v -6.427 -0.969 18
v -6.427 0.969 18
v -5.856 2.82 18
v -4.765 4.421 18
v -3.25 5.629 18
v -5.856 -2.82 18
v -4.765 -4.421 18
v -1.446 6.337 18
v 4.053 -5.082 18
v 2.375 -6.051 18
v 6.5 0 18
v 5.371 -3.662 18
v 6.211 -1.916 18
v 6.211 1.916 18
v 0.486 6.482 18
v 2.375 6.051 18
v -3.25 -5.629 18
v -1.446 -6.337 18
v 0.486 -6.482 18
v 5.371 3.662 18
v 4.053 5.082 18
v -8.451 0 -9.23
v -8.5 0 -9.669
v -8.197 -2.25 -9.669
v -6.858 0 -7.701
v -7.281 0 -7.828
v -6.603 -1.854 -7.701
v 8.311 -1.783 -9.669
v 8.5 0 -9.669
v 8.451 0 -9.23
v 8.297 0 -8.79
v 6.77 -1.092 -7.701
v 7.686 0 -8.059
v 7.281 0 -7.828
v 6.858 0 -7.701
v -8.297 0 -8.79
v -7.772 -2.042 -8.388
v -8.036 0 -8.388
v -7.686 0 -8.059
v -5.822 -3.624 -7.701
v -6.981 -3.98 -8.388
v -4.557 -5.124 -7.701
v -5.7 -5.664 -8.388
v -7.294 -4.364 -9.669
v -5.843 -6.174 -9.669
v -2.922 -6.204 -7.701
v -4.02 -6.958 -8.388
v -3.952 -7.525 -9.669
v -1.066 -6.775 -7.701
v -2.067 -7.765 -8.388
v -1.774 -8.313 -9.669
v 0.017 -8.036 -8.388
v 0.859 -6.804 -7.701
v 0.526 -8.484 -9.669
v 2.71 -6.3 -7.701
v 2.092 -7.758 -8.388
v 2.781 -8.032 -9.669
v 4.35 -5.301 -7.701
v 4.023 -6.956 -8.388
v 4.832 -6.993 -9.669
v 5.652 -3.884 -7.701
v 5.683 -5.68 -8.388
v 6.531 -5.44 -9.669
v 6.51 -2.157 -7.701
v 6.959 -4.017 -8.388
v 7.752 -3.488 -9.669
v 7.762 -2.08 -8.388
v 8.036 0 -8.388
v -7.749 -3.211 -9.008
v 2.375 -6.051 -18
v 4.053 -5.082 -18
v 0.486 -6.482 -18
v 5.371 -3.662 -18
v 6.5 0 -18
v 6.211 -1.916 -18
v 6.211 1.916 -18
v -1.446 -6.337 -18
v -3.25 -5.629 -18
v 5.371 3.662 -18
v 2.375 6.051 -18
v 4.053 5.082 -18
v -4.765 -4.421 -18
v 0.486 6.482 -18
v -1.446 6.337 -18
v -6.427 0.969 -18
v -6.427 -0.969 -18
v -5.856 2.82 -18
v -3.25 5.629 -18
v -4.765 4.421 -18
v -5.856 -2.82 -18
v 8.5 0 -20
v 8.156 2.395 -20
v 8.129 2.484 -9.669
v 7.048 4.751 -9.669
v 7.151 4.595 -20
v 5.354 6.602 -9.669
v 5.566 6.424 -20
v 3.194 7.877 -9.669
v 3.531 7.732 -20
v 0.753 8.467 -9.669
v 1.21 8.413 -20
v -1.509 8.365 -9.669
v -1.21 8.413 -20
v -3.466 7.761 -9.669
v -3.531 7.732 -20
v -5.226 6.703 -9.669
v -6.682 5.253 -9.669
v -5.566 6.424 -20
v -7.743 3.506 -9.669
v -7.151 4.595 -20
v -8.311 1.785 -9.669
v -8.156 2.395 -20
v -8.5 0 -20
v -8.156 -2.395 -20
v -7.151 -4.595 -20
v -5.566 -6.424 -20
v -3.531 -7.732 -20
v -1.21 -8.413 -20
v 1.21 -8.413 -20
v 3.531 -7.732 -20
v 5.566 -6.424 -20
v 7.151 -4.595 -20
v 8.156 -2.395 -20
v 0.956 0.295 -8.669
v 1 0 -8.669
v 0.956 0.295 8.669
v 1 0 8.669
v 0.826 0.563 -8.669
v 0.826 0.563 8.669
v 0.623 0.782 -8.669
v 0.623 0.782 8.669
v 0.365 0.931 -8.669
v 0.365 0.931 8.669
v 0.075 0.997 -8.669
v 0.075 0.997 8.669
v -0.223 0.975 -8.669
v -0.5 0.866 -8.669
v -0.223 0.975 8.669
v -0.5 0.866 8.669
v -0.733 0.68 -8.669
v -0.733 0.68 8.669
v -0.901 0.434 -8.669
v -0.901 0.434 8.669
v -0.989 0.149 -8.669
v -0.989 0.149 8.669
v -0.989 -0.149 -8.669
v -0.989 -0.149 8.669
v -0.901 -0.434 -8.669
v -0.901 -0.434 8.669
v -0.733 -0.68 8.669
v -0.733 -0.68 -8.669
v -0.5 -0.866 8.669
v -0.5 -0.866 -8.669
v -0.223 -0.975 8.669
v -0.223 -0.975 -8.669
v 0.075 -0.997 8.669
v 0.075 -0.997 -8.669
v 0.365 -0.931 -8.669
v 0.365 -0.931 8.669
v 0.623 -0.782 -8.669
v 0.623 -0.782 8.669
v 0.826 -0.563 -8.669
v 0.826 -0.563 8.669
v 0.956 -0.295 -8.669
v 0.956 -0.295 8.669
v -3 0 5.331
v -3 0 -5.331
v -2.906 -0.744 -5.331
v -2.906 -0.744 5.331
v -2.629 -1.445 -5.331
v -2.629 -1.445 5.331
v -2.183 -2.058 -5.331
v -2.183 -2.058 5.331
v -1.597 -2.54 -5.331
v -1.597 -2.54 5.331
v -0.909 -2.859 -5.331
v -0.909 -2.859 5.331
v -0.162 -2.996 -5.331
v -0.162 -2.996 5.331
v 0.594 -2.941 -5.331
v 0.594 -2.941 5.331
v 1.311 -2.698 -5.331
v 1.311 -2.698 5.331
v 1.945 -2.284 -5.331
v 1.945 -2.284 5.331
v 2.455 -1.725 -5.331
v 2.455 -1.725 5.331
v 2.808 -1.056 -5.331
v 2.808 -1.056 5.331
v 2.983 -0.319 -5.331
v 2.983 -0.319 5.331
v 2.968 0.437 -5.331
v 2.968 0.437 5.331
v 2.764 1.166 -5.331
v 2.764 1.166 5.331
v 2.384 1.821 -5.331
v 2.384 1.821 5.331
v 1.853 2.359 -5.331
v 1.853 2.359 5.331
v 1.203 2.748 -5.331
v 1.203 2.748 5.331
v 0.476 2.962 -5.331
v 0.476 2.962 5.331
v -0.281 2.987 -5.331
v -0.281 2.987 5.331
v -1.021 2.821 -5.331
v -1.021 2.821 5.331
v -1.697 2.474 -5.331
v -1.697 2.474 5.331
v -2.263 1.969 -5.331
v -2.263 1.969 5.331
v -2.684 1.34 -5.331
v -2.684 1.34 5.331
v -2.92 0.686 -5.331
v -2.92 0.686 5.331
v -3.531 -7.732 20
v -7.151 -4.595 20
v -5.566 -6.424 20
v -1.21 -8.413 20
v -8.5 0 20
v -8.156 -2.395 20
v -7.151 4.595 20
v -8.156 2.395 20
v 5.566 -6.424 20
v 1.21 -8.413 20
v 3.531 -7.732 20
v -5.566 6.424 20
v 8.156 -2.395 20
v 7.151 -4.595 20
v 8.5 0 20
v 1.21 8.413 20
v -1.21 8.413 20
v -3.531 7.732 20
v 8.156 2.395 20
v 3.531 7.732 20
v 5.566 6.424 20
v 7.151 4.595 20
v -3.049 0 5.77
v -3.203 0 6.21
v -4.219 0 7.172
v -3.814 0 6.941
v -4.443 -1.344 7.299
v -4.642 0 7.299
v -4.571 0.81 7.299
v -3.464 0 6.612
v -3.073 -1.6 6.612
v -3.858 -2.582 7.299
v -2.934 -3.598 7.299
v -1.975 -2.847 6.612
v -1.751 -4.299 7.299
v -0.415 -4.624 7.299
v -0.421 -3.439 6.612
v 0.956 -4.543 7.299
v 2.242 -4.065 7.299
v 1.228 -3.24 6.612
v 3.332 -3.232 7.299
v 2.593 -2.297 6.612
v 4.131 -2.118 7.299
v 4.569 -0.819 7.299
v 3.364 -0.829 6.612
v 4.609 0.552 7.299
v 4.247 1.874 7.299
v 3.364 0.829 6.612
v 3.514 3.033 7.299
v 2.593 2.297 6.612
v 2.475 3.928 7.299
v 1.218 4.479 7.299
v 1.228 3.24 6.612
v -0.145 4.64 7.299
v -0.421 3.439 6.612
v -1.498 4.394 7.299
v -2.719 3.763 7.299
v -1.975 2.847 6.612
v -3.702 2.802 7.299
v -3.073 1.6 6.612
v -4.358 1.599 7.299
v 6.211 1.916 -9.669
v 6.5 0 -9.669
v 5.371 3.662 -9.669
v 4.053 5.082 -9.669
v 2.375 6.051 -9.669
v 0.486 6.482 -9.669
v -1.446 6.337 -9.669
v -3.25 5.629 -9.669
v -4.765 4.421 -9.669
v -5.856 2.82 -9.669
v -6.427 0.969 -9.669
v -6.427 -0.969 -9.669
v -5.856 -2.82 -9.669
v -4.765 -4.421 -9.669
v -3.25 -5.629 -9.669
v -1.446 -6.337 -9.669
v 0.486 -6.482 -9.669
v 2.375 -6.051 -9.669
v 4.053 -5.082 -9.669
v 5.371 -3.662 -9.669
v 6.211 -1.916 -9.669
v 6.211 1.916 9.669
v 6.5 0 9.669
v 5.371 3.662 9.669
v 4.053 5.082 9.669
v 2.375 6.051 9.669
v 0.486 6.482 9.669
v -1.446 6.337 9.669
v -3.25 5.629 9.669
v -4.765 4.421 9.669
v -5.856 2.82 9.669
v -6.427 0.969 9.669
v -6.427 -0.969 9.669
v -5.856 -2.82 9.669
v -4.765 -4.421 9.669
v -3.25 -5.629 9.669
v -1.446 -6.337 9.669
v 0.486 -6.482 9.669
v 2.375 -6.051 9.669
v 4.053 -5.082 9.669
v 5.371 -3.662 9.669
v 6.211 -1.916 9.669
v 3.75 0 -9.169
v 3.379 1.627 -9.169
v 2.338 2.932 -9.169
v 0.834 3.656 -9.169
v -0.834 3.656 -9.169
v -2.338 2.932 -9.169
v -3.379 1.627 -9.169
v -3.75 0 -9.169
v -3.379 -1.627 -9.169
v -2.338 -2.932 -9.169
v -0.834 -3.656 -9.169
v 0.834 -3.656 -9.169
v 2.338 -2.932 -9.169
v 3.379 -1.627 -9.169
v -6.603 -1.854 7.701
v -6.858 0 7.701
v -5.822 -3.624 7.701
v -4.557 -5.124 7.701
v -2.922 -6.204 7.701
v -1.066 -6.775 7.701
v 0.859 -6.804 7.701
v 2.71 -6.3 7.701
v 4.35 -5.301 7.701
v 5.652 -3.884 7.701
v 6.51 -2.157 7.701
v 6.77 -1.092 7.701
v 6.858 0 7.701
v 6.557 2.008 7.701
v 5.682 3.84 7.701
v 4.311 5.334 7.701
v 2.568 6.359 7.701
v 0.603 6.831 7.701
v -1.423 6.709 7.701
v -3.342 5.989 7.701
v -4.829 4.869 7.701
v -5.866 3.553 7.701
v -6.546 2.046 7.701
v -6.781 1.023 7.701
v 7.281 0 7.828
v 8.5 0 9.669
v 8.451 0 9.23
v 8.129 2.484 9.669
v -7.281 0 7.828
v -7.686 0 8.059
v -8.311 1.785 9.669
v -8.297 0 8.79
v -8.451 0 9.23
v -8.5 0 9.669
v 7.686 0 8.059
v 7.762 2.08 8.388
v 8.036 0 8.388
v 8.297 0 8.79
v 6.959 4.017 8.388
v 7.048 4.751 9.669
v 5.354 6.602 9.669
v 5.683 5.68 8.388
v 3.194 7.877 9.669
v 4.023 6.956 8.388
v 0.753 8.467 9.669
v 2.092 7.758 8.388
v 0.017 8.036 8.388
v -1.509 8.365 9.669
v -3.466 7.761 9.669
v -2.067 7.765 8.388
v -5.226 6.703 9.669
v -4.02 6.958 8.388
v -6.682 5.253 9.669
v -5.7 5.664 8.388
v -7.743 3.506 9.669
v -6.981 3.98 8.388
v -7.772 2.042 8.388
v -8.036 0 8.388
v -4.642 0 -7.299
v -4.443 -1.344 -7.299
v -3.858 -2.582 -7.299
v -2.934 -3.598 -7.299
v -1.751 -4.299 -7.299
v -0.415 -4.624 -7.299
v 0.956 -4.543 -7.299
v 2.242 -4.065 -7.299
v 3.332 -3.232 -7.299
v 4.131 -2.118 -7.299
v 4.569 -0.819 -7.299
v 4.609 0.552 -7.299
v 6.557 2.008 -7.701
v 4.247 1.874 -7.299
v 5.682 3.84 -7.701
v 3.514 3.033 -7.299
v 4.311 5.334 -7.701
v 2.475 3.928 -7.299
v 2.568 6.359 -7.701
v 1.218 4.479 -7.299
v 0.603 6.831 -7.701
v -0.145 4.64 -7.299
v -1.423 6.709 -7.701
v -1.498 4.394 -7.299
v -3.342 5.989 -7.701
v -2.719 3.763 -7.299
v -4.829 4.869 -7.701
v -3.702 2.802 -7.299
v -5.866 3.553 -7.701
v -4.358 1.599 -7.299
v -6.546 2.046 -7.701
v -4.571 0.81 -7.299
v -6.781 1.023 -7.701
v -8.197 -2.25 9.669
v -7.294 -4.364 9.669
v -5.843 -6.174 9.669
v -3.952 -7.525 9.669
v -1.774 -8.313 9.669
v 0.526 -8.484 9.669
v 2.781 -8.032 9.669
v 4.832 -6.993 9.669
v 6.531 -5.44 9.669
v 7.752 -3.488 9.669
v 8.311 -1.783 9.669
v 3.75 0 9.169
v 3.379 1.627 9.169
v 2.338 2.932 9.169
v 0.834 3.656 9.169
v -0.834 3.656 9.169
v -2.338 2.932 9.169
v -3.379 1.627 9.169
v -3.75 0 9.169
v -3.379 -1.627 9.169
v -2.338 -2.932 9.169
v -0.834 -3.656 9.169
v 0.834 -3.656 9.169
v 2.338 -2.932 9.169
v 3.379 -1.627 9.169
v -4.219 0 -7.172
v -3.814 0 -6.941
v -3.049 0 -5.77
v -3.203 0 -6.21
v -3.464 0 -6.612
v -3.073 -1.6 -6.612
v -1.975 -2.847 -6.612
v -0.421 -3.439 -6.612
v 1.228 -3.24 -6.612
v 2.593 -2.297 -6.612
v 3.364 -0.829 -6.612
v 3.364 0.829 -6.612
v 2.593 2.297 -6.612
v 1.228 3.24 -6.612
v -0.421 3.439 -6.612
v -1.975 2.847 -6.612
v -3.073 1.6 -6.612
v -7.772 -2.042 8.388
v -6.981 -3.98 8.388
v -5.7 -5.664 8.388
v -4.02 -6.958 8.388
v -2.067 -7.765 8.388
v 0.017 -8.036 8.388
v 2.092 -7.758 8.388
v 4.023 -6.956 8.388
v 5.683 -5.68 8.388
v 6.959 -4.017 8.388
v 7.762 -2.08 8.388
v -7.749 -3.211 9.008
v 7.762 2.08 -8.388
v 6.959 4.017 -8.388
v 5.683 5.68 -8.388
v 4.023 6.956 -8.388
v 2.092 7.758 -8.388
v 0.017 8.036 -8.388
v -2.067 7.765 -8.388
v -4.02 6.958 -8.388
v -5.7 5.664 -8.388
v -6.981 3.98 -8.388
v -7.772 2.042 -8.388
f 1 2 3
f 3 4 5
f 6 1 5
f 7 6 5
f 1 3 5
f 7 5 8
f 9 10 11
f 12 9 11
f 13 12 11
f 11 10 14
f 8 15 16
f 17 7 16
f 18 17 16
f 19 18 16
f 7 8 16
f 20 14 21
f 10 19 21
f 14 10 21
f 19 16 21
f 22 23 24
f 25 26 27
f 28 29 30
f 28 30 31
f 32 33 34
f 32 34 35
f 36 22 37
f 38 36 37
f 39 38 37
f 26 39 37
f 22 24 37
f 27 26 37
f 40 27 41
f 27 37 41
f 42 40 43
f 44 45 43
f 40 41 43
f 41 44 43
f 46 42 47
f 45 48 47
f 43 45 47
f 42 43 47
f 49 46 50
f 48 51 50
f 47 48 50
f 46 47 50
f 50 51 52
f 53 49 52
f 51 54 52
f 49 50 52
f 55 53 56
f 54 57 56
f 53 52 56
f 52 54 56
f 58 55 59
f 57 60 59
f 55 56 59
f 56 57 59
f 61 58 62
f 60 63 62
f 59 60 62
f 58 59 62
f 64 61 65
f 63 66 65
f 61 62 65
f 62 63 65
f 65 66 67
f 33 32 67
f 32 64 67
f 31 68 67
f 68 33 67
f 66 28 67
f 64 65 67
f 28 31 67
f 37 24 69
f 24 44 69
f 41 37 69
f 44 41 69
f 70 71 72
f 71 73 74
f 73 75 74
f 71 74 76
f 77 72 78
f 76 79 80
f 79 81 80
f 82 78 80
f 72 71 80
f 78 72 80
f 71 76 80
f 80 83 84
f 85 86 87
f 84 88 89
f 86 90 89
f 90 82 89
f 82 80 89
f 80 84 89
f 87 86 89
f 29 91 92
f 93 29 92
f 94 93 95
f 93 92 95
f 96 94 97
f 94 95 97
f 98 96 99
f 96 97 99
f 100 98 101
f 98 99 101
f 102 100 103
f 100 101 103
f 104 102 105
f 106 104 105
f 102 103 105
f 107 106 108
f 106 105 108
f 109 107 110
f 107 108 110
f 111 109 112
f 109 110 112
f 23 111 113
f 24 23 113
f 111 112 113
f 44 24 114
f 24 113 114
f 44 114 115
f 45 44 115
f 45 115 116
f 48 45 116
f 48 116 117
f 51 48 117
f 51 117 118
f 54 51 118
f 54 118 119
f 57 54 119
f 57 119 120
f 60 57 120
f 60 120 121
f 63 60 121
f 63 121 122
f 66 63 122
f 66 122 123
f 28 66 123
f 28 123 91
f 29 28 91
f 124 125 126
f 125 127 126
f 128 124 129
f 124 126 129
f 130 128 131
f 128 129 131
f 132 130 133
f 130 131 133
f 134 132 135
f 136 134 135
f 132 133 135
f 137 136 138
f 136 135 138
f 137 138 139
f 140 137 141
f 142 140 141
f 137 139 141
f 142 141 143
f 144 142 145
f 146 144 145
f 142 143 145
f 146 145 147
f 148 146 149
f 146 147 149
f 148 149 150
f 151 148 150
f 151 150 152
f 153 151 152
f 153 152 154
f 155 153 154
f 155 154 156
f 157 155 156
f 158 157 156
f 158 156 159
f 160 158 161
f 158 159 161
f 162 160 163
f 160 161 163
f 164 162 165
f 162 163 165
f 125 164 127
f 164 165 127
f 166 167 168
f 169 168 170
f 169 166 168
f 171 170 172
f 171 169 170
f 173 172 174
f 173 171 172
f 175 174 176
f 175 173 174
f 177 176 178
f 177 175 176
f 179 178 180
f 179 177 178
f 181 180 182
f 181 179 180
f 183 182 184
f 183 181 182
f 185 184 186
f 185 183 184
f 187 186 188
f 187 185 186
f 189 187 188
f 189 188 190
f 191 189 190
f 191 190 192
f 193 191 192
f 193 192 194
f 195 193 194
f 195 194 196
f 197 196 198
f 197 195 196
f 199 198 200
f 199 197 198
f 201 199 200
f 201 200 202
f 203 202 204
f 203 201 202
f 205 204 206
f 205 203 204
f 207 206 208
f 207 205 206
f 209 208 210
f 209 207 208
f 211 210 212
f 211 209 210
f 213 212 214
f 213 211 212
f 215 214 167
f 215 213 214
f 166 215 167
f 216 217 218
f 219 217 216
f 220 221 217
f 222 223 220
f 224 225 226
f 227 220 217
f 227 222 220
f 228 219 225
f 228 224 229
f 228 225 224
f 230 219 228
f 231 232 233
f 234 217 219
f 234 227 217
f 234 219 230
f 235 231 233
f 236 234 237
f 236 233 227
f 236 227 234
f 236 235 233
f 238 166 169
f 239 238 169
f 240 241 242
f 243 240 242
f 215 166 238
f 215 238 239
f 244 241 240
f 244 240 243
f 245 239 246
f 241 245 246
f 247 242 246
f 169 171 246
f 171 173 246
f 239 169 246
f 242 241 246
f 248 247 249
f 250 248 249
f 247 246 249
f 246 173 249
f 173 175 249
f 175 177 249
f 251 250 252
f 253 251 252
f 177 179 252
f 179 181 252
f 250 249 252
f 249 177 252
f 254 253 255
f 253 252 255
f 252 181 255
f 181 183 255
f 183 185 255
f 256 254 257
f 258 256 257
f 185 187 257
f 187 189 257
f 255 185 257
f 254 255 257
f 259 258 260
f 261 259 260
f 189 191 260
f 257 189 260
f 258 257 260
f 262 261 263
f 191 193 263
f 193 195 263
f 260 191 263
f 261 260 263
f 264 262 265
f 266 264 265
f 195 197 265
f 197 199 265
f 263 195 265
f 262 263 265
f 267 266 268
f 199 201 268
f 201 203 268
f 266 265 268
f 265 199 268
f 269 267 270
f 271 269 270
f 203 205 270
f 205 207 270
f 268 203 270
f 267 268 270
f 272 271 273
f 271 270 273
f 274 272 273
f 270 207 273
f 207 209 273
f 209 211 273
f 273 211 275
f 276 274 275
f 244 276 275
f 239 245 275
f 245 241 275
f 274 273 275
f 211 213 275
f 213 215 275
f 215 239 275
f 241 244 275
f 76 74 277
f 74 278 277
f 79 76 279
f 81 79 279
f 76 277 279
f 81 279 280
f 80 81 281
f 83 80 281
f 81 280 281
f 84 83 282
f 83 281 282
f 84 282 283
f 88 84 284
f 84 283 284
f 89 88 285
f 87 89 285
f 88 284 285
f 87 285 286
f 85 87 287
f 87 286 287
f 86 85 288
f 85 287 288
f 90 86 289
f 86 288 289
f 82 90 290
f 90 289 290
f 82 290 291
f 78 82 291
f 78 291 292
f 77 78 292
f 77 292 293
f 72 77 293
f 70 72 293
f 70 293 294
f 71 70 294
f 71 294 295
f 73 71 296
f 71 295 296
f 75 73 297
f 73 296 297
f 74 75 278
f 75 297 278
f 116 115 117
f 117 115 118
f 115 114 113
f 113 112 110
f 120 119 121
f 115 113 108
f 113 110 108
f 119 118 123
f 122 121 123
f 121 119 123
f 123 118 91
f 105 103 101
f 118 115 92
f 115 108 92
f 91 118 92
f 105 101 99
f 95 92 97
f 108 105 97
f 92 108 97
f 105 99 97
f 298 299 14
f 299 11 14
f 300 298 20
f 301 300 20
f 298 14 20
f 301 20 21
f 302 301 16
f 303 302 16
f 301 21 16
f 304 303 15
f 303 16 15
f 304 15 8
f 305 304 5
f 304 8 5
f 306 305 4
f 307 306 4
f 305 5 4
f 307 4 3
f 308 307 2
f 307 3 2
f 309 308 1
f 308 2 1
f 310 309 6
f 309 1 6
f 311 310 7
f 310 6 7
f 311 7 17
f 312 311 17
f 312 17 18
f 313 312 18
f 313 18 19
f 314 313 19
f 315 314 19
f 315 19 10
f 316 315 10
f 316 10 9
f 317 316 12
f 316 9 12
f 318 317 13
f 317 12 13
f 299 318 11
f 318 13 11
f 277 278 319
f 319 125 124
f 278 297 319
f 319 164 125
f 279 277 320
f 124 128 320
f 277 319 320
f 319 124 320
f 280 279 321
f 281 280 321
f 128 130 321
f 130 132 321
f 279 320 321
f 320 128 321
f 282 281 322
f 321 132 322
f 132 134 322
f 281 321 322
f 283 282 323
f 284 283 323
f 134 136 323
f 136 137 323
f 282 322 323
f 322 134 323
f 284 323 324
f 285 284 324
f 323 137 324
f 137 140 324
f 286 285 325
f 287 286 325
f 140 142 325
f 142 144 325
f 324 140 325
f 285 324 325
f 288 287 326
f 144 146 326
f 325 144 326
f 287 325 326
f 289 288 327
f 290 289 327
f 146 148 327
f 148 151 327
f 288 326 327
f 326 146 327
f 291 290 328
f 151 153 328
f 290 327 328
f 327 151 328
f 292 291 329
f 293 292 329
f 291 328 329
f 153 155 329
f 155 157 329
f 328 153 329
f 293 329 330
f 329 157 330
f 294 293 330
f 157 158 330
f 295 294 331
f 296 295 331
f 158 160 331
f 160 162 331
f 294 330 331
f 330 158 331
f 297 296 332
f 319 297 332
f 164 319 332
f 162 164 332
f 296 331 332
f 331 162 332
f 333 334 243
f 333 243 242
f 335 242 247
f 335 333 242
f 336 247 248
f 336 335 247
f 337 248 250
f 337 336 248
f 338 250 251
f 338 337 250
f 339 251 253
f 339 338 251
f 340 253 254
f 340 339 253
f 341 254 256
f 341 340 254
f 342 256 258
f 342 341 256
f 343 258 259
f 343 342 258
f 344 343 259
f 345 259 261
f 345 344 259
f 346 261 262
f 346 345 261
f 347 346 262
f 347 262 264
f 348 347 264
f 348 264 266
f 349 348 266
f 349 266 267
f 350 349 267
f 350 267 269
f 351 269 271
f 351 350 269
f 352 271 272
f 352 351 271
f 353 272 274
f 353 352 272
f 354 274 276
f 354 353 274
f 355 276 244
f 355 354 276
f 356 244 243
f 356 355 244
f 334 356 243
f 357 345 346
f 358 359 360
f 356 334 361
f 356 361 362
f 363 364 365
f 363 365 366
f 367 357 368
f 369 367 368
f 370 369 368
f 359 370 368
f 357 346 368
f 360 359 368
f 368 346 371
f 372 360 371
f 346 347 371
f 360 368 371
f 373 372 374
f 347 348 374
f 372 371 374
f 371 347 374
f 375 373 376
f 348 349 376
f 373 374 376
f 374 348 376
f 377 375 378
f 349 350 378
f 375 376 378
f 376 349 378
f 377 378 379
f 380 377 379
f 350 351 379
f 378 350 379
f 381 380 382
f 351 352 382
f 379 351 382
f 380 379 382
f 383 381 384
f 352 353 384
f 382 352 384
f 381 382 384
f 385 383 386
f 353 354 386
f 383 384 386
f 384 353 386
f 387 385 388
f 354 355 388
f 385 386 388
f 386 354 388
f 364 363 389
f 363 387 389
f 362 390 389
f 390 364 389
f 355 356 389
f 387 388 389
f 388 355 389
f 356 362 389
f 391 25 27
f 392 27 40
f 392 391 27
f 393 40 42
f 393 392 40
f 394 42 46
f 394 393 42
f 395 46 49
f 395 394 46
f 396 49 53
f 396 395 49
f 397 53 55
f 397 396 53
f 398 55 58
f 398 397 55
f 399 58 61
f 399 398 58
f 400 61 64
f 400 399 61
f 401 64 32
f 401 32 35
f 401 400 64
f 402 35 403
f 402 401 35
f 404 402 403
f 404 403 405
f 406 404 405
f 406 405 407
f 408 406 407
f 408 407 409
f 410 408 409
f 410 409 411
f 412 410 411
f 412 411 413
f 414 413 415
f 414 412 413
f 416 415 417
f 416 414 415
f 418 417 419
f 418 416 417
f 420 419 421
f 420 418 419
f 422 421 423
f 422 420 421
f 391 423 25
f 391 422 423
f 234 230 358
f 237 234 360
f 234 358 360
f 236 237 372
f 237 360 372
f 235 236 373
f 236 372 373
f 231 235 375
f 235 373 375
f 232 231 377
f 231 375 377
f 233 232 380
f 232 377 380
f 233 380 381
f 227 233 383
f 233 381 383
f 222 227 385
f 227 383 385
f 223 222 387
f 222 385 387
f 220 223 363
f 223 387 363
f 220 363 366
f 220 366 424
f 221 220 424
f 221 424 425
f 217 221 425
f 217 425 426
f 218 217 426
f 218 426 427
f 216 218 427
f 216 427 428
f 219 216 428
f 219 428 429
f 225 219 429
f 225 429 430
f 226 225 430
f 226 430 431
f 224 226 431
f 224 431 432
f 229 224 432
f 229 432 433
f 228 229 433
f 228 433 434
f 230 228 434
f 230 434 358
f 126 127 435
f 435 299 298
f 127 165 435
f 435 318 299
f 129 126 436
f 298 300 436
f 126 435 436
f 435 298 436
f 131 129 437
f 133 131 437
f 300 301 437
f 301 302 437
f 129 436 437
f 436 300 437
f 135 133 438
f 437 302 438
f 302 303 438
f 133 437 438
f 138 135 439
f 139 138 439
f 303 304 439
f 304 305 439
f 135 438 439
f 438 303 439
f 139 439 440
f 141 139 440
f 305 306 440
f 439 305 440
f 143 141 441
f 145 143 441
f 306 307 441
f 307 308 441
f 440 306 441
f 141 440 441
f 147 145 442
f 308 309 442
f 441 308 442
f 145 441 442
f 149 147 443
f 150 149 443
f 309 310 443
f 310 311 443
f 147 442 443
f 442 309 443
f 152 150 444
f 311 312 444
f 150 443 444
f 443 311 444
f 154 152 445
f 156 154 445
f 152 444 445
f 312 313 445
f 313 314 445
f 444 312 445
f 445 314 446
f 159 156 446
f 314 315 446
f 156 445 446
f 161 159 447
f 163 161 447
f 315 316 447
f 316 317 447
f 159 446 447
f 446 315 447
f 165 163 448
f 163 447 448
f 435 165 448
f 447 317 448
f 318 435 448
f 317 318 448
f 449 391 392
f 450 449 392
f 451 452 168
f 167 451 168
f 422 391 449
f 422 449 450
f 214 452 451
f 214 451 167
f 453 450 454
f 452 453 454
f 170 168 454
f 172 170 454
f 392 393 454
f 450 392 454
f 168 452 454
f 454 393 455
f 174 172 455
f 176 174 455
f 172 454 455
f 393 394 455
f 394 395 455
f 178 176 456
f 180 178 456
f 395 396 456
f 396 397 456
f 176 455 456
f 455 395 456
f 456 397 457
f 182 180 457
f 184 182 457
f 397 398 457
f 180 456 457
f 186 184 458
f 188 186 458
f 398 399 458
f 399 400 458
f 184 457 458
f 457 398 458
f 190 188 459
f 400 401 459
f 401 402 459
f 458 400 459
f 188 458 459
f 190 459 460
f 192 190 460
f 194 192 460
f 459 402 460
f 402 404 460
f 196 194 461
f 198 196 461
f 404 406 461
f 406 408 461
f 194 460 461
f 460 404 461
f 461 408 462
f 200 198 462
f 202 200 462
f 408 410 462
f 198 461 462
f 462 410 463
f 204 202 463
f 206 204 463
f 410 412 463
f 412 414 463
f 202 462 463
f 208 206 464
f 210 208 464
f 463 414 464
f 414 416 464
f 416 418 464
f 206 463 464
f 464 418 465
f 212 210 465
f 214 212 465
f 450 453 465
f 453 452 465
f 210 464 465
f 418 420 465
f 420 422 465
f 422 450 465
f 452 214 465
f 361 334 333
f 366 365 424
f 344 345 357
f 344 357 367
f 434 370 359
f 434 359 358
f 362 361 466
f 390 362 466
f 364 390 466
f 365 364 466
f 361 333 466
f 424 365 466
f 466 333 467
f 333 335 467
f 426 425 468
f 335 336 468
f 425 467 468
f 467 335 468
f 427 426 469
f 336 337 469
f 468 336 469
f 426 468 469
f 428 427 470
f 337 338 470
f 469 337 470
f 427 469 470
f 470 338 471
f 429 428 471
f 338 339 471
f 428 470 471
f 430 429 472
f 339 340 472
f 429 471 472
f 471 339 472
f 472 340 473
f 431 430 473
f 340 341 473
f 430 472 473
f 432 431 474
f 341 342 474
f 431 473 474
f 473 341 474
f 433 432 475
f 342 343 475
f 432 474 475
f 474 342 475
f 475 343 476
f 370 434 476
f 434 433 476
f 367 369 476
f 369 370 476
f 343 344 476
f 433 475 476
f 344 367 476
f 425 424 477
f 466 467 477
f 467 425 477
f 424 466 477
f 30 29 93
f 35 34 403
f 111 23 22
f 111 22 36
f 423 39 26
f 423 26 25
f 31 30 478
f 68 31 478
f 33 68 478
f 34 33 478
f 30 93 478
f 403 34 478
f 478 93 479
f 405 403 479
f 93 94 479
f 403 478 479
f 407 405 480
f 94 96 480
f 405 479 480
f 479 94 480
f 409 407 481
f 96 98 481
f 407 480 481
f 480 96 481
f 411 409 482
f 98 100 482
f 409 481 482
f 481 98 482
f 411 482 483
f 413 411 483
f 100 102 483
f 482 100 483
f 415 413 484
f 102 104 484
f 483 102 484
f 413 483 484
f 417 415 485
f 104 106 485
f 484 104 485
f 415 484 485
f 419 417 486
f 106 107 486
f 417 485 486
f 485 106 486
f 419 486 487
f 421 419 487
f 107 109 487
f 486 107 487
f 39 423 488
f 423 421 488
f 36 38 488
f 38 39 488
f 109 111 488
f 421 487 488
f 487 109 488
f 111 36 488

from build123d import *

# Parameters (mm, degrees)
BOSS_EXTRUDE1_DEPTH      = 20
BOSS_EXTRUDE1_DEPTH_BACK = 20
SKETCH1_R                = 8.5
FILLET1_R                = 2


# Read off the part's stored shape, not the designer's step: Shell1
with BuildPart() as part:
    # Sketch1 → Boss-Extrude1 (new, two sides: drawn at the far end of the back side and taken through both)
    with BuildSketch(Plane.XY.offset(-BOSS_EXTRUDE1_DEPTH_BACK)):
        Circle(SKETCH1_R)
    extrude(amount=BOSS_EXTRUDE1_DEPTH + BOSS_EXTRUDE1_DEPTH_BACK)

    # Sketch2 → Cut-Revolve1 (revolve, cut)
    with BuildSketch(Plane(origin=(0, 0, 0), x_dir=(0, 0, -1), z_dir=(1, 0, 0)), mode=Mode.PRIVATE) as cut_revolve1_sk:
        Polygon((-8, 8.5), (8, 8.5), (7, 3), (-7, 3), align=None)
    revolve(cut_revolve1_sk.sketch.rotate(Axis((0, 0, -22), (0, 0, 1)), 90), axis=Axis((0, 0, -22), (0, 0, 1)), mode=Mode.SUBTRACT)

    # Shell1 outline → Shell1 (revolve, cut)
    with BuildSketch(Plane.XZ):
        Polygon((1, 8.669152707), (6.5, 9.669152707), (6.5, 18), (0, 18), (0, -18), (6.5, -18), (6.5, -9.669152707), (1, -8.669152707), align=None)
    revolve(axis=Axis((0, 0, 0), (0, 0, 1)), mode=Mode.SUBTRACT)

    # Fillet1
    fillet1_edges = [part.edges().sort_by_distance(p)[0] for p in [
        (3, 0, 7),
        (0, 8.5, 8),
        (0, 8.5, -8),
        (3, 0, -7),
    ]]
    fillet(fillet1_edges, radius=FILLET1_R)


solid = part.part
